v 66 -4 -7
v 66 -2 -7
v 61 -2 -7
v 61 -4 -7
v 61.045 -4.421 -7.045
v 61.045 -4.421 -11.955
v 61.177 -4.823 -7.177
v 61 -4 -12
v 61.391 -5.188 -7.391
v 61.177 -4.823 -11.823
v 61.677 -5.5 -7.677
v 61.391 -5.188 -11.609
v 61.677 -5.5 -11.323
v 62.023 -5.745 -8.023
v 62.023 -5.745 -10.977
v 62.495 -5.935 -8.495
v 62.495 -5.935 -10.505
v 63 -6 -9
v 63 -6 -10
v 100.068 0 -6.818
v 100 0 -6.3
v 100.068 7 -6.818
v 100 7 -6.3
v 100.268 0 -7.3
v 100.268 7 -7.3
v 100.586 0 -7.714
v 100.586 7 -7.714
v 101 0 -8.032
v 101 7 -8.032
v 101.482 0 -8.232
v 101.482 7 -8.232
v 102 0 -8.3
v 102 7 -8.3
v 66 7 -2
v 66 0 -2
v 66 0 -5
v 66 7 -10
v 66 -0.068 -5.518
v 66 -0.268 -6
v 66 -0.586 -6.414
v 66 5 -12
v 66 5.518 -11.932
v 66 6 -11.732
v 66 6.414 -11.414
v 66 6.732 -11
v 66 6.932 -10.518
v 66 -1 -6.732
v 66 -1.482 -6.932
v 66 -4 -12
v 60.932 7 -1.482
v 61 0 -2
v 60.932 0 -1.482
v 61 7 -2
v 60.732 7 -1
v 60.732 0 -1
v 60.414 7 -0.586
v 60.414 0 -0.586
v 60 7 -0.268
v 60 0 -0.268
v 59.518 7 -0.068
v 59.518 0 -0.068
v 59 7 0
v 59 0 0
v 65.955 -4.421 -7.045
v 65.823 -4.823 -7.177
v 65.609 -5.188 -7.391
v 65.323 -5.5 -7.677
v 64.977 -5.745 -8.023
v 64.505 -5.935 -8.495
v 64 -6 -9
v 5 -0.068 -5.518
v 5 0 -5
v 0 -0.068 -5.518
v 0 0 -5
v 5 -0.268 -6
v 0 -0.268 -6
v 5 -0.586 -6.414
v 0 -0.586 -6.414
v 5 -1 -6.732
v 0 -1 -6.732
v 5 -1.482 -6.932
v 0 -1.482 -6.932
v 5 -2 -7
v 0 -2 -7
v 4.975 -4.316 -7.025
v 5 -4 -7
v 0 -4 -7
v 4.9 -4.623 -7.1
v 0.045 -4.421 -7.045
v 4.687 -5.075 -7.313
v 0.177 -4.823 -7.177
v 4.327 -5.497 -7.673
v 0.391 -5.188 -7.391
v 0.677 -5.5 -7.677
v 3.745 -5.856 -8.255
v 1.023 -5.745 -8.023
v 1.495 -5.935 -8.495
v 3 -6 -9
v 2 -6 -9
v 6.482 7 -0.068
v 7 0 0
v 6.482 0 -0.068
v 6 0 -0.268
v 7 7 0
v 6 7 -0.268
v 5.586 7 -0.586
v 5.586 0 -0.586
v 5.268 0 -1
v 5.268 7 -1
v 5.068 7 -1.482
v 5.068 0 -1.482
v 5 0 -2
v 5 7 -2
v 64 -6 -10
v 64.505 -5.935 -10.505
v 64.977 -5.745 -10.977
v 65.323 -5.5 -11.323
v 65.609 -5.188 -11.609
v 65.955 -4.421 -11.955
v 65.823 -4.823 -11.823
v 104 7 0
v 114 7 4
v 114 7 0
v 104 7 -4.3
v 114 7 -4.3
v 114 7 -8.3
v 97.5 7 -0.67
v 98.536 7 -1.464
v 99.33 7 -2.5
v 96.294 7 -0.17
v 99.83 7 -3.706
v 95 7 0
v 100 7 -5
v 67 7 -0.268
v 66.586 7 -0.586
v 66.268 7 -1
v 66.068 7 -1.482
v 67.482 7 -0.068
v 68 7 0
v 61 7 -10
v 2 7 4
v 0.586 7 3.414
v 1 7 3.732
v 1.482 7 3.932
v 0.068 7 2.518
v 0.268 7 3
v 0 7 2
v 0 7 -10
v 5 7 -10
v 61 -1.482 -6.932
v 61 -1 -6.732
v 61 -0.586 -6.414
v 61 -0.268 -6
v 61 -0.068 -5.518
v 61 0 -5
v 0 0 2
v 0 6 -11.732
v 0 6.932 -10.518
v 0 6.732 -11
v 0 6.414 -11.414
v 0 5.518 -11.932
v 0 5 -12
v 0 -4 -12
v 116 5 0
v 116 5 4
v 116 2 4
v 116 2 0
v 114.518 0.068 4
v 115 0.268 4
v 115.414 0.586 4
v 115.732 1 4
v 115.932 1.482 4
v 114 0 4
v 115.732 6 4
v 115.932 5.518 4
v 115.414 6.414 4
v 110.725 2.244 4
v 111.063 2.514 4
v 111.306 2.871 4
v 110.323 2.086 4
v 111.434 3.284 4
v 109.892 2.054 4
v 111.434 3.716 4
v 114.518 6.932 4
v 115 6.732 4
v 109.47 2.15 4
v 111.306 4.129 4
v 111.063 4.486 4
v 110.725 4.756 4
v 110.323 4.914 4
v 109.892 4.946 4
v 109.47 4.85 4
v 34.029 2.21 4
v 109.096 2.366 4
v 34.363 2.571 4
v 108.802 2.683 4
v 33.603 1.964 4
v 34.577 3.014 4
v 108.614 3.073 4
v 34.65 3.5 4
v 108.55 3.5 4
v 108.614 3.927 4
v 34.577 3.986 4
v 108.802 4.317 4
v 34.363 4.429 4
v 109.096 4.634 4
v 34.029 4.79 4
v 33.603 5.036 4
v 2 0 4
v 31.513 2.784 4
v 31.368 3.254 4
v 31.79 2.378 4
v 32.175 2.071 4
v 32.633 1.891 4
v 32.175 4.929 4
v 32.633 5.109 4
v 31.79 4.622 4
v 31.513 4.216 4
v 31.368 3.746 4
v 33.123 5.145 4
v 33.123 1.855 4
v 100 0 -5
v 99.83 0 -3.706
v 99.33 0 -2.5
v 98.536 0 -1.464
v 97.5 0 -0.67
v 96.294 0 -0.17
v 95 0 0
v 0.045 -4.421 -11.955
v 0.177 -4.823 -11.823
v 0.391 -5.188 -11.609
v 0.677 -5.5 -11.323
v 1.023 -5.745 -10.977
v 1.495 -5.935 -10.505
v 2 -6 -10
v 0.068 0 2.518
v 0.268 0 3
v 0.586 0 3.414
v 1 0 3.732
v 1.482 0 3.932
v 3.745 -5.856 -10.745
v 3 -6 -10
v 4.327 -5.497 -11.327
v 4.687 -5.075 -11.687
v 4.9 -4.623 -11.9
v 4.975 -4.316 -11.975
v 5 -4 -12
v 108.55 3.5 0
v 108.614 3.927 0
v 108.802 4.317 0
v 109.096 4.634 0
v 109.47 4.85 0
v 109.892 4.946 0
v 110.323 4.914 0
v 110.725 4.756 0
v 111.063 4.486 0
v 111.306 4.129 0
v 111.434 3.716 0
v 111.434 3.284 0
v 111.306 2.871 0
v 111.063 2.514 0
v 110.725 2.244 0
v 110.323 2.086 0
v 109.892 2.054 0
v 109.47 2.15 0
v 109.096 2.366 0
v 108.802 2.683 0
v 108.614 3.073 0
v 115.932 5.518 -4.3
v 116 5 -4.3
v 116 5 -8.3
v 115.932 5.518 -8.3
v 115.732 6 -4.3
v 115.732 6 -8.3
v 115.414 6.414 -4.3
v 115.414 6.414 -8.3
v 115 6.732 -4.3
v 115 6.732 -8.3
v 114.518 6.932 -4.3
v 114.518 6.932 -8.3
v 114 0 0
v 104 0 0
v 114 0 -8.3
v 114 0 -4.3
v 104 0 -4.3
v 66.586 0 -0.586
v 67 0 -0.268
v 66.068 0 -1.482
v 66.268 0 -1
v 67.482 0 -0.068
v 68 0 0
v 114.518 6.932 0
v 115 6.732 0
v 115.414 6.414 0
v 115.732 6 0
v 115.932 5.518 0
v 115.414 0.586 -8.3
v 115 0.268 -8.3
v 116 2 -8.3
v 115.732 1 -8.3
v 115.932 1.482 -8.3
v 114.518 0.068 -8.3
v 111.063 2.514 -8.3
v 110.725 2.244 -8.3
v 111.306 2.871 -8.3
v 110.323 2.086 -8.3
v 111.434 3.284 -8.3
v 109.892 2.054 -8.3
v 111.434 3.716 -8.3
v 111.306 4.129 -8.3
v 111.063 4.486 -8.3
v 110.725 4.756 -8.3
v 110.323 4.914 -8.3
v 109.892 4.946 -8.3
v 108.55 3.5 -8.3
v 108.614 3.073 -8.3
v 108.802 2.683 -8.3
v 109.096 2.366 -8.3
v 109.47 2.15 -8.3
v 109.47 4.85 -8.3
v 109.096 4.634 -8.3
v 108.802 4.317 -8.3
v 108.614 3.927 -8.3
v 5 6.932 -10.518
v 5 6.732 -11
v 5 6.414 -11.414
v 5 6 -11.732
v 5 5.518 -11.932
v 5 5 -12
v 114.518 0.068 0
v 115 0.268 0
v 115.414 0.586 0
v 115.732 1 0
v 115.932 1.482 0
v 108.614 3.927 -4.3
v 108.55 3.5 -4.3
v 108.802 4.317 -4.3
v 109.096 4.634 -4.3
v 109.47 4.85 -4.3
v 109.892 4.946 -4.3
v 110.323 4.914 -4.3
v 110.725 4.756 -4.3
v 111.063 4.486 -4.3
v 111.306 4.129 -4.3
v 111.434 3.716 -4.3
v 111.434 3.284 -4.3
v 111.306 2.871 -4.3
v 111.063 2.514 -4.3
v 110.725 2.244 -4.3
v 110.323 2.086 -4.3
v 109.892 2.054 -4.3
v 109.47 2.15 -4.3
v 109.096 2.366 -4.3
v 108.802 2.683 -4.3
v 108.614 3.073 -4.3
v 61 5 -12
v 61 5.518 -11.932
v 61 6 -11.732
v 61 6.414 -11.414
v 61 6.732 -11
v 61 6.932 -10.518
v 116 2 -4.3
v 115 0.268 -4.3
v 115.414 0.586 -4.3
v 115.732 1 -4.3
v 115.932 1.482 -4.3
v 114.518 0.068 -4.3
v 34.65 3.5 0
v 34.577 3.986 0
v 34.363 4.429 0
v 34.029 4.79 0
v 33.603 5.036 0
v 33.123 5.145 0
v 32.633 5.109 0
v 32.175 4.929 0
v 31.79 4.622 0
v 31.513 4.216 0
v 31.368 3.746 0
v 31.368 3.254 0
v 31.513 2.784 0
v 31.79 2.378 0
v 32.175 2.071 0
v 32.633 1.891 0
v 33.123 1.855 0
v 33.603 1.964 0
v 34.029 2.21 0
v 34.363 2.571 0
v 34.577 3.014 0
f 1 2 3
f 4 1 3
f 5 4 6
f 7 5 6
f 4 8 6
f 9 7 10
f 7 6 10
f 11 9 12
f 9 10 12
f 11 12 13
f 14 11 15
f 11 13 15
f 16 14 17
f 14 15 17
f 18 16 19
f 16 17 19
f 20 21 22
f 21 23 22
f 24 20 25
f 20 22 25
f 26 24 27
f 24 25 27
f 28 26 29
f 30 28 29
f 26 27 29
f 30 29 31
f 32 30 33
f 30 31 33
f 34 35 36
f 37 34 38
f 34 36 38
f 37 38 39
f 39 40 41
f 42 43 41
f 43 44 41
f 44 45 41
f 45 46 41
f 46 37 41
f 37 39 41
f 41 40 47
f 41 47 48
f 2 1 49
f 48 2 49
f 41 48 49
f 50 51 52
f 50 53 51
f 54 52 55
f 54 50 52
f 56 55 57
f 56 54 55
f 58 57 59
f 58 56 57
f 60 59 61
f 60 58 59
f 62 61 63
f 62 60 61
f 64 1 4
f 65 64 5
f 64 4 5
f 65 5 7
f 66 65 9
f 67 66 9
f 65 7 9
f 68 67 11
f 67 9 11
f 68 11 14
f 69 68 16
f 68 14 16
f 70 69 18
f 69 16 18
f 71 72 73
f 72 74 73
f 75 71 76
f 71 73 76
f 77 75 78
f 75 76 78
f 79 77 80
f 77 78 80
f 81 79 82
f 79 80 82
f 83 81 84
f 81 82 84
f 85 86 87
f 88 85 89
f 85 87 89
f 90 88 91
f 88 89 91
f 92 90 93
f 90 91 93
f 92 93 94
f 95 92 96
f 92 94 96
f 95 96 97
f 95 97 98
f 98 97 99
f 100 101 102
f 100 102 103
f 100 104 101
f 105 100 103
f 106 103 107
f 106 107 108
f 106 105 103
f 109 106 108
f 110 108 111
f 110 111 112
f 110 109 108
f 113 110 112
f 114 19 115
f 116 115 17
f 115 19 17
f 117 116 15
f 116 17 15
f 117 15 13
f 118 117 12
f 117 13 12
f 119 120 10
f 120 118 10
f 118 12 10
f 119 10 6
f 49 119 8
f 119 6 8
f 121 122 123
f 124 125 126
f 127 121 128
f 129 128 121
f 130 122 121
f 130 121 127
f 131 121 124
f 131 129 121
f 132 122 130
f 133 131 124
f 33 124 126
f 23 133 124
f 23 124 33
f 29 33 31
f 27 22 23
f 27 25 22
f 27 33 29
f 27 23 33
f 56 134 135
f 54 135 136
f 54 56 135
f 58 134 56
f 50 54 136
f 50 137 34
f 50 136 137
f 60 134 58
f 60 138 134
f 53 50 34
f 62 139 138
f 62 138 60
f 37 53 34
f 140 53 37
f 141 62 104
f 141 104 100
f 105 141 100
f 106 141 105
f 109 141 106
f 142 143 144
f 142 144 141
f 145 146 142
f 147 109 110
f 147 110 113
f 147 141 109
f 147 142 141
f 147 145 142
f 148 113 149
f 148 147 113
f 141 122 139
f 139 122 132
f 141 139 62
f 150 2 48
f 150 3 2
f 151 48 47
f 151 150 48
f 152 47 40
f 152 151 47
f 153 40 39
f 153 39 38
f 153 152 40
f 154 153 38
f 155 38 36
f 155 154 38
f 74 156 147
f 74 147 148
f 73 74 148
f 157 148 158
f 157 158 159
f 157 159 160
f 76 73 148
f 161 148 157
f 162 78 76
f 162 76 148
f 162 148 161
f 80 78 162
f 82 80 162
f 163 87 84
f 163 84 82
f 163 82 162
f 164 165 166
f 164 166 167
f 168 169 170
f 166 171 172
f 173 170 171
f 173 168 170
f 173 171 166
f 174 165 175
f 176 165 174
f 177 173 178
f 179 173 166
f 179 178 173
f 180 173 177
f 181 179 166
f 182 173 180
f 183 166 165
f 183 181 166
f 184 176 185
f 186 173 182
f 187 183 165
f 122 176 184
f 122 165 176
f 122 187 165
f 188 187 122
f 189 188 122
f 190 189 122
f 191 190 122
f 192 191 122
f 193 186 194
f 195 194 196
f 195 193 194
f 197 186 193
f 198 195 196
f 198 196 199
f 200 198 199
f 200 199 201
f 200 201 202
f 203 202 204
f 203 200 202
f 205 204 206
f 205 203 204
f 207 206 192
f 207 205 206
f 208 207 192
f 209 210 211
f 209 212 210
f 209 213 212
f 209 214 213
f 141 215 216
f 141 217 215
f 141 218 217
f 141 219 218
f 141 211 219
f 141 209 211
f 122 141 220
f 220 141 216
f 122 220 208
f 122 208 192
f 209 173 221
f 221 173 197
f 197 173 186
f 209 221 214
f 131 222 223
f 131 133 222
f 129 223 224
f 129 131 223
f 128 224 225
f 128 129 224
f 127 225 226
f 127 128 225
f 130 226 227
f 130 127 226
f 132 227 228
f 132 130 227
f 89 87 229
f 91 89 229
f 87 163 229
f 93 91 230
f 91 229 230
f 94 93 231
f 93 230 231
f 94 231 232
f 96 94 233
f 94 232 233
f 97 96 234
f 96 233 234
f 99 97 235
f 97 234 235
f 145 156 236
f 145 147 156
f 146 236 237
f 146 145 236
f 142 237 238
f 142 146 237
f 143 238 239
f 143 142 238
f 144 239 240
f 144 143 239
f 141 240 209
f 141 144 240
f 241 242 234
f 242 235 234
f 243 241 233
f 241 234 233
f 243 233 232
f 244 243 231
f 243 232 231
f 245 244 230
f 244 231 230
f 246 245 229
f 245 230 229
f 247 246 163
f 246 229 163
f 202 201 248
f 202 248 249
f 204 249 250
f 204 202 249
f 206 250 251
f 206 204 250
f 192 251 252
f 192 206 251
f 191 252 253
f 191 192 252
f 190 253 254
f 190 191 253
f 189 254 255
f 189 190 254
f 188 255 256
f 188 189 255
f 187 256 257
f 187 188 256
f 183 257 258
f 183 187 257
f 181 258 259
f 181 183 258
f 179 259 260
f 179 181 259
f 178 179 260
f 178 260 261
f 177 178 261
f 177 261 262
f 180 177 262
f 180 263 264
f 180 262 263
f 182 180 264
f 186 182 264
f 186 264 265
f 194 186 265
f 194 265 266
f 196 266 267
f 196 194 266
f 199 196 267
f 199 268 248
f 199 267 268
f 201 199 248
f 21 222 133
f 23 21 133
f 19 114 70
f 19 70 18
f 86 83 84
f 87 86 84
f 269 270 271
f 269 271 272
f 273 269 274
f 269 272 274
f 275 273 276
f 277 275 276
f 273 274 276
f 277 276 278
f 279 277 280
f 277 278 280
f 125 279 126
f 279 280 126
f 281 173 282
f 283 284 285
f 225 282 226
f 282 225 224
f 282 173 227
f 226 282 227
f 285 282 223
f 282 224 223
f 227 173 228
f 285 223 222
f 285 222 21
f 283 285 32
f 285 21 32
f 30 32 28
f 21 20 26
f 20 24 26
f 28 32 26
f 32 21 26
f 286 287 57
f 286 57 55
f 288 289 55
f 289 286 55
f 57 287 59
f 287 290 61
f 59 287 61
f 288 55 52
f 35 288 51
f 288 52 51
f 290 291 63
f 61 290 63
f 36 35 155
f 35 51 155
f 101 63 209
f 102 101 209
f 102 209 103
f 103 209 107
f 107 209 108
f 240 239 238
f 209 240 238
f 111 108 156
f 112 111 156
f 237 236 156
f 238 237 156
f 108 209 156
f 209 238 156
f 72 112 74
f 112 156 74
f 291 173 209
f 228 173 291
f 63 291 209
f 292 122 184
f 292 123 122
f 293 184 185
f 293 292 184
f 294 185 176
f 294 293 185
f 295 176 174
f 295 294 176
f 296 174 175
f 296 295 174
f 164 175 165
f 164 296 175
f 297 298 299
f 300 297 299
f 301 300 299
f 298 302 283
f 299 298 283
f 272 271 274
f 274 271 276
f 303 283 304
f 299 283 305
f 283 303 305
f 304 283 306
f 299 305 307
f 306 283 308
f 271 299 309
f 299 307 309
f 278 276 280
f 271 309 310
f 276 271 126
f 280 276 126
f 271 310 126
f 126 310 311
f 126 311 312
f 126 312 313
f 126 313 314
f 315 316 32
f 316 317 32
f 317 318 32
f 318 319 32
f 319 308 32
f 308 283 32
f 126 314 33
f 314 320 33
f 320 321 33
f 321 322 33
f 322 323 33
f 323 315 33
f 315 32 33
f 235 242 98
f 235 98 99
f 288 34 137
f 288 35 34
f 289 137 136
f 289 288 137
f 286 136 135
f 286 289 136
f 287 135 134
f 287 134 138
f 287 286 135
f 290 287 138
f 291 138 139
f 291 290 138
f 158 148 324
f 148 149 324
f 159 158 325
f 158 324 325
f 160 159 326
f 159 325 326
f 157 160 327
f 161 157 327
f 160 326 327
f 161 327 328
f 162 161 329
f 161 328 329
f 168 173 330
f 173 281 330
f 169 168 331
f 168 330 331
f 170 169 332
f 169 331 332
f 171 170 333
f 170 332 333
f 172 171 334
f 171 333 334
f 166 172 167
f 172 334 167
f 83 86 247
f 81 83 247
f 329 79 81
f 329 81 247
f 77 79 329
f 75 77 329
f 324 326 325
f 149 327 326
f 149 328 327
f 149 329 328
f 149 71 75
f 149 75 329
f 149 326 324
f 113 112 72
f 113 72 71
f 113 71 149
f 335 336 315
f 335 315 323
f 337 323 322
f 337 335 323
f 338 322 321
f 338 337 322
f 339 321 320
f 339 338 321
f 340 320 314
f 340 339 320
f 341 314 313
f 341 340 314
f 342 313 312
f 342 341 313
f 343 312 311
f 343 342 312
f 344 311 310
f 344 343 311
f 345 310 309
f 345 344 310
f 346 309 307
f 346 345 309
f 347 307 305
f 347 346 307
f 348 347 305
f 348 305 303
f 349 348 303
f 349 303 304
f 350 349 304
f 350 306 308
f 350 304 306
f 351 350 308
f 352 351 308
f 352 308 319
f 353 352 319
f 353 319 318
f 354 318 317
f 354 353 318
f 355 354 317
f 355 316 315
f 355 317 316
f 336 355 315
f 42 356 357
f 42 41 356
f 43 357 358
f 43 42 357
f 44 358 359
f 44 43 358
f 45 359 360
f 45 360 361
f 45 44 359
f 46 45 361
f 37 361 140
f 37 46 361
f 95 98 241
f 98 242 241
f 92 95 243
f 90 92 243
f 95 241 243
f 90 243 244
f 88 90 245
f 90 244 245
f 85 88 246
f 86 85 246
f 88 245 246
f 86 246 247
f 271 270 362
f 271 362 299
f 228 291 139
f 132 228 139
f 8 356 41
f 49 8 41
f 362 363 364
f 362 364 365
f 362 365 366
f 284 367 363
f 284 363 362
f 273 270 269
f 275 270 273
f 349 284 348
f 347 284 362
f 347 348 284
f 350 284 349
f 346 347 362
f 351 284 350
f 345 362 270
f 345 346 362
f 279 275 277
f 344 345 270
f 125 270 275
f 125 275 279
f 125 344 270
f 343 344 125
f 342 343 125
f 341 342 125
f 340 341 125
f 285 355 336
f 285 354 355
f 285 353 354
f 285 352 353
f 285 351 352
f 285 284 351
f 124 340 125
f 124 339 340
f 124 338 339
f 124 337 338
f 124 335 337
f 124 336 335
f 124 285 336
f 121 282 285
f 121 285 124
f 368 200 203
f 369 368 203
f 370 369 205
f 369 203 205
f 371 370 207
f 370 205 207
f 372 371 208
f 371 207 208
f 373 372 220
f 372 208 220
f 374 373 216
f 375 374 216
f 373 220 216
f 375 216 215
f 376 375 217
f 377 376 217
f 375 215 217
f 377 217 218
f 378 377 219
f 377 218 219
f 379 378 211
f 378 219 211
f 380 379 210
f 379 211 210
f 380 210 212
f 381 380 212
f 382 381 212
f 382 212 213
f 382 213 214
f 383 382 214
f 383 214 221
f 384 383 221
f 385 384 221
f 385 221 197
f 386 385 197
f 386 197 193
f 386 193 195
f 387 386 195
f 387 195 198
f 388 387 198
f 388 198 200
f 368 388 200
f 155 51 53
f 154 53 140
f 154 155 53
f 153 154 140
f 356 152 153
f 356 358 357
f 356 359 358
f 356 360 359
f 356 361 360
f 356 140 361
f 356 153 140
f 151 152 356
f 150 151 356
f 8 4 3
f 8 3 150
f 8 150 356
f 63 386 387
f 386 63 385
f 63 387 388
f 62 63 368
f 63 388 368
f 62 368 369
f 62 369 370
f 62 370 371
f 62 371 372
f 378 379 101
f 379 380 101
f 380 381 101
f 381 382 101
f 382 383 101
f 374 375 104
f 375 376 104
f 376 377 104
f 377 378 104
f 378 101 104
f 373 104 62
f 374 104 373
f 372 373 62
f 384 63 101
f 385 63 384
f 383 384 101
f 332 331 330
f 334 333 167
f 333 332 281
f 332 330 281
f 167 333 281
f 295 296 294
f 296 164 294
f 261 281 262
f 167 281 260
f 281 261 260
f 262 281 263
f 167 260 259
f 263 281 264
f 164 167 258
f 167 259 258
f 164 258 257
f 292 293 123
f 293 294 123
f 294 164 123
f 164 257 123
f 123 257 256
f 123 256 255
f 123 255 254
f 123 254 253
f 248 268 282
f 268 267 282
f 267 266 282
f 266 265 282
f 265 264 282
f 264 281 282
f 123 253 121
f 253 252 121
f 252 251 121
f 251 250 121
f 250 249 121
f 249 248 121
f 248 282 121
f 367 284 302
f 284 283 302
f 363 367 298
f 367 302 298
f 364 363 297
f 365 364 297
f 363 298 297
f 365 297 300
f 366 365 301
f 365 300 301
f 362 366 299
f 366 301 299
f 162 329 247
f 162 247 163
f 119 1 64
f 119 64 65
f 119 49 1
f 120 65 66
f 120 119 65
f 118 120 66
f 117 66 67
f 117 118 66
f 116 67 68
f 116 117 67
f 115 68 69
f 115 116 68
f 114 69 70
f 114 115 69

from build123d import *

# Parameters (mm, degrees)
SKETCH1_W               = 66
SKETCH1_H               = 4
BOSS_EXTRUDE1_DEPTH     = 7
SKETCH2_R               = 1.65
CUT_EXTRUDE1_DEPTH      = 67.49060084
SKETCH3_W               = 5
SKETCH3_H               = 3.5
BOSS_EXTRUDE2_DEPTH     = 12
SKETCH4_W               = 5
SKETCH4_H               = 5
BOSS_EXTRUDE3_DEPTH     = 6
SKETCH5_W               = 4
SKETCH5_H               = 7
BOSS_EXTRUDE4_DEPTH     = 50
SKETCH7_W               = 5
SKETCH7_H               = 12
BOSS_EXTRUDE5_DEPTH     = 3.5
FILLET1_R               = 2
FILLET2_R               = 2
SKETCH8_W               = 4
SKETCH8_H               = 7
BOSS_EXTRUDE6_DEPTH     = 8.3
SKETCH9_W               = 4
SKETCH9_H               = 7
BOSS_EXTRUDE7_DEPTH     = 12
CUT_EXTRUDE2_DEPTH      = 117.828934772
CUT_EXTRUDE2_DEPTH_BACK = 117.828934772
SKETCH6_R               = 1.45
FILLET3_R               = 2
FILLET4_R               = 5
FILLET5_R               = 2


with BuildPart() as part:
    # Sketch1 → Boss-Extrude1 (new body)
    with BuildSketch(Plane(origin=(0, 0, 0), x_dir=(1, 0, 0), z_dir=(0, 1, 0))):
        with Locations((33, -2)):
            Rectangle(SKETCH1_W, SKETCH1_H)
    extrude(amount=BOSS_EXTRUDE1_DEPTH)

    # Sketch2 → Cut-Extrude1 (cut, through all)
    with BuildSketch(Plane.XY.offset(4)):
        with Locations((33, 3.5)):
            Circle(SKETCH2_R)
    extrude(amount=-CUT_EXTRUDE1_DEPTH, mode=Mode.SUBTRACT)

    # Sketch3 → Boss-Extrude2 (add)
    with BuildSketch(Plane(origin=(0, 0, 0), x_dir=(-1, 0, 0), z_dir=(0, 0, -1))):
        with Locations((-63.5, 1.75)):
            Rectangle(SKETCH3_W, SKETCH3_H)
        with Locations((-2.5, 1.75)):
            Rectangle(SKETCH3_W, SKETCH3_H)
    extrude(amount=BOSS_EXTRUDE2_DEPTH)

    # Sketch4 → Boss-Extrude3 (add)
    with BuildSketch(Plane(origin=(0, 0, 0), x_dir=(-1, 0, 0), z_dir=(0, -1, 0))):
        with Locations((-63.5, 9.5)):
            Rectangle(SKETCH4_W, SKETCH4_H)
        with Locations((-2.5, 9.5)):
            Rectangle(SKETCH4_W, SKETCH4_H)
    extrude(amount=BOSS_EXTRUDE3_DEPTH)

    # Sketch5 → Boss-Extrude4 (add)
    with BuildSketch(Plane(origin=(66, 0, 0), x_dir=(0, 0, -1), z_dir=(1, 0, 0))):
        with Locations((-2, 3.5)):
            Rectangle(SKETCH5_W, SKETCH5_H)
    extrude(amount=BOSS_EXTRUDE4_DEPTH)

    # Sketch7 → Boss-Extrude5 (add)
    with BuildSketch(Plane(origin=(0, 3.5, 0), x_dir=(1, 0, 0), z_dir=(0, 1, 0))):
        with Locations((63.5, 6)):
            Rectangle(SKETCH7_W, SKETCH7_H)
        with Locations((2.5, 6)):
            Rectangle(SKETCH7_W, SKETCH7_H)
    extrude(amount=BOSS_EXTRUDE5_DEPTH)

    # Fillet1
    fillet1_edges = [part.edges().sort_by_distance(p)[0] for p in [
        (66, -6, -9.5),
        (63.5, -6, -7),
        (61, -6, -9.5),
        (63.5, -6, -12),
        (5, -6, -9.5),
        (2.5, -6, -7),
        (0, -6, -9.5),
        (2.5, -6, -12),
    ]]
    fillet(fillet1_edges, radius=FILLET1_R)

    # Fillet2
    fillet2_edges = [part.edges().sort_by_distance(p)[0] for p in [
        (61, 3.5, 0),
        (5, 3.5, 0),
        (63.5, 0, -7),
        (2.5, 0, -7),
        (66, 3.5, 0),
        (116, 0, 2),
        (116, 7, 2),
        (0, 3.5, 4),
        (63.5, 7, -12),
        (2.5, 7, -12),
    ]]
    fillet(fillet2_edges, radius=FILLET2_R)

    # Sketch8 → Boss-Extrude6 (add)
    with BuildSketch(Plane(origin=(0, 0, 0), x_dir=(-1, 0, 0), z_dir=(0, 0, -1))):
        with Locations((-102, 3.5)):
            Rectangle(SKETCH8_W, SKETCH8_H)
    extrude(amount=BOSS_EXTRUDE6_DEPTH)

    # Sketch9 → Boss-Extrude7 (add)
    with BuildSketch(Plane(origin=(104, 0, 0), x_dir=(0, 0, -1), z_dir=(1, 0, 0))):
        with Locations((6.3, 3.5)):
            Rectangle(SKETCH9_W, SKETCH9_H)
    extrude(amount=BOSS_EXTRUDE7_DEPTH)

    # Sketch6 → Cut-Extrude2 (cut, two sides: drawn at the far end of the back side and taken through both)
    with BuildSketch(Plane(origin=(0, 0, 0), x_dir=(-1, 0, 0), z_dir=(0, 0, -1)).offset(-CUT_EXTRUDE2_DEPTH_BACK)):
        with Locations((-110, 3.5)):
            Circle(SKETCH6_R)
    extrude(amount=CUT_EXTRUDE2_DEPTH + CUT_EXTRUDE2_DEPTH_BACK, mode=Mode.SUBTRACT)

    # Fillet3
    fillet3_edges = [part.edges().sort_by_distance(p)[0] for p in [
        (116, 7, -6.3),
        (116, 0, -6.3),
    ]]
    fillet(fillet3_edges, radius=FILLET3_R)

    # Fillet4
    fillet4_edges = [part.edges().sort_by_distance(p)[0] for p in [
        (100, 3.5, 0),
    ]]
    fillet(fillet4_edges, radius=FILLET4_R)

    # Fillet5
    fillet5_edges = [part.edges().sort_by_distance(p)[0] for p in [
        (100, 3.5, -8.3),
    ]]
    fillet(fillet5_edges, radius=FILLET5_R)


solid = part.part
